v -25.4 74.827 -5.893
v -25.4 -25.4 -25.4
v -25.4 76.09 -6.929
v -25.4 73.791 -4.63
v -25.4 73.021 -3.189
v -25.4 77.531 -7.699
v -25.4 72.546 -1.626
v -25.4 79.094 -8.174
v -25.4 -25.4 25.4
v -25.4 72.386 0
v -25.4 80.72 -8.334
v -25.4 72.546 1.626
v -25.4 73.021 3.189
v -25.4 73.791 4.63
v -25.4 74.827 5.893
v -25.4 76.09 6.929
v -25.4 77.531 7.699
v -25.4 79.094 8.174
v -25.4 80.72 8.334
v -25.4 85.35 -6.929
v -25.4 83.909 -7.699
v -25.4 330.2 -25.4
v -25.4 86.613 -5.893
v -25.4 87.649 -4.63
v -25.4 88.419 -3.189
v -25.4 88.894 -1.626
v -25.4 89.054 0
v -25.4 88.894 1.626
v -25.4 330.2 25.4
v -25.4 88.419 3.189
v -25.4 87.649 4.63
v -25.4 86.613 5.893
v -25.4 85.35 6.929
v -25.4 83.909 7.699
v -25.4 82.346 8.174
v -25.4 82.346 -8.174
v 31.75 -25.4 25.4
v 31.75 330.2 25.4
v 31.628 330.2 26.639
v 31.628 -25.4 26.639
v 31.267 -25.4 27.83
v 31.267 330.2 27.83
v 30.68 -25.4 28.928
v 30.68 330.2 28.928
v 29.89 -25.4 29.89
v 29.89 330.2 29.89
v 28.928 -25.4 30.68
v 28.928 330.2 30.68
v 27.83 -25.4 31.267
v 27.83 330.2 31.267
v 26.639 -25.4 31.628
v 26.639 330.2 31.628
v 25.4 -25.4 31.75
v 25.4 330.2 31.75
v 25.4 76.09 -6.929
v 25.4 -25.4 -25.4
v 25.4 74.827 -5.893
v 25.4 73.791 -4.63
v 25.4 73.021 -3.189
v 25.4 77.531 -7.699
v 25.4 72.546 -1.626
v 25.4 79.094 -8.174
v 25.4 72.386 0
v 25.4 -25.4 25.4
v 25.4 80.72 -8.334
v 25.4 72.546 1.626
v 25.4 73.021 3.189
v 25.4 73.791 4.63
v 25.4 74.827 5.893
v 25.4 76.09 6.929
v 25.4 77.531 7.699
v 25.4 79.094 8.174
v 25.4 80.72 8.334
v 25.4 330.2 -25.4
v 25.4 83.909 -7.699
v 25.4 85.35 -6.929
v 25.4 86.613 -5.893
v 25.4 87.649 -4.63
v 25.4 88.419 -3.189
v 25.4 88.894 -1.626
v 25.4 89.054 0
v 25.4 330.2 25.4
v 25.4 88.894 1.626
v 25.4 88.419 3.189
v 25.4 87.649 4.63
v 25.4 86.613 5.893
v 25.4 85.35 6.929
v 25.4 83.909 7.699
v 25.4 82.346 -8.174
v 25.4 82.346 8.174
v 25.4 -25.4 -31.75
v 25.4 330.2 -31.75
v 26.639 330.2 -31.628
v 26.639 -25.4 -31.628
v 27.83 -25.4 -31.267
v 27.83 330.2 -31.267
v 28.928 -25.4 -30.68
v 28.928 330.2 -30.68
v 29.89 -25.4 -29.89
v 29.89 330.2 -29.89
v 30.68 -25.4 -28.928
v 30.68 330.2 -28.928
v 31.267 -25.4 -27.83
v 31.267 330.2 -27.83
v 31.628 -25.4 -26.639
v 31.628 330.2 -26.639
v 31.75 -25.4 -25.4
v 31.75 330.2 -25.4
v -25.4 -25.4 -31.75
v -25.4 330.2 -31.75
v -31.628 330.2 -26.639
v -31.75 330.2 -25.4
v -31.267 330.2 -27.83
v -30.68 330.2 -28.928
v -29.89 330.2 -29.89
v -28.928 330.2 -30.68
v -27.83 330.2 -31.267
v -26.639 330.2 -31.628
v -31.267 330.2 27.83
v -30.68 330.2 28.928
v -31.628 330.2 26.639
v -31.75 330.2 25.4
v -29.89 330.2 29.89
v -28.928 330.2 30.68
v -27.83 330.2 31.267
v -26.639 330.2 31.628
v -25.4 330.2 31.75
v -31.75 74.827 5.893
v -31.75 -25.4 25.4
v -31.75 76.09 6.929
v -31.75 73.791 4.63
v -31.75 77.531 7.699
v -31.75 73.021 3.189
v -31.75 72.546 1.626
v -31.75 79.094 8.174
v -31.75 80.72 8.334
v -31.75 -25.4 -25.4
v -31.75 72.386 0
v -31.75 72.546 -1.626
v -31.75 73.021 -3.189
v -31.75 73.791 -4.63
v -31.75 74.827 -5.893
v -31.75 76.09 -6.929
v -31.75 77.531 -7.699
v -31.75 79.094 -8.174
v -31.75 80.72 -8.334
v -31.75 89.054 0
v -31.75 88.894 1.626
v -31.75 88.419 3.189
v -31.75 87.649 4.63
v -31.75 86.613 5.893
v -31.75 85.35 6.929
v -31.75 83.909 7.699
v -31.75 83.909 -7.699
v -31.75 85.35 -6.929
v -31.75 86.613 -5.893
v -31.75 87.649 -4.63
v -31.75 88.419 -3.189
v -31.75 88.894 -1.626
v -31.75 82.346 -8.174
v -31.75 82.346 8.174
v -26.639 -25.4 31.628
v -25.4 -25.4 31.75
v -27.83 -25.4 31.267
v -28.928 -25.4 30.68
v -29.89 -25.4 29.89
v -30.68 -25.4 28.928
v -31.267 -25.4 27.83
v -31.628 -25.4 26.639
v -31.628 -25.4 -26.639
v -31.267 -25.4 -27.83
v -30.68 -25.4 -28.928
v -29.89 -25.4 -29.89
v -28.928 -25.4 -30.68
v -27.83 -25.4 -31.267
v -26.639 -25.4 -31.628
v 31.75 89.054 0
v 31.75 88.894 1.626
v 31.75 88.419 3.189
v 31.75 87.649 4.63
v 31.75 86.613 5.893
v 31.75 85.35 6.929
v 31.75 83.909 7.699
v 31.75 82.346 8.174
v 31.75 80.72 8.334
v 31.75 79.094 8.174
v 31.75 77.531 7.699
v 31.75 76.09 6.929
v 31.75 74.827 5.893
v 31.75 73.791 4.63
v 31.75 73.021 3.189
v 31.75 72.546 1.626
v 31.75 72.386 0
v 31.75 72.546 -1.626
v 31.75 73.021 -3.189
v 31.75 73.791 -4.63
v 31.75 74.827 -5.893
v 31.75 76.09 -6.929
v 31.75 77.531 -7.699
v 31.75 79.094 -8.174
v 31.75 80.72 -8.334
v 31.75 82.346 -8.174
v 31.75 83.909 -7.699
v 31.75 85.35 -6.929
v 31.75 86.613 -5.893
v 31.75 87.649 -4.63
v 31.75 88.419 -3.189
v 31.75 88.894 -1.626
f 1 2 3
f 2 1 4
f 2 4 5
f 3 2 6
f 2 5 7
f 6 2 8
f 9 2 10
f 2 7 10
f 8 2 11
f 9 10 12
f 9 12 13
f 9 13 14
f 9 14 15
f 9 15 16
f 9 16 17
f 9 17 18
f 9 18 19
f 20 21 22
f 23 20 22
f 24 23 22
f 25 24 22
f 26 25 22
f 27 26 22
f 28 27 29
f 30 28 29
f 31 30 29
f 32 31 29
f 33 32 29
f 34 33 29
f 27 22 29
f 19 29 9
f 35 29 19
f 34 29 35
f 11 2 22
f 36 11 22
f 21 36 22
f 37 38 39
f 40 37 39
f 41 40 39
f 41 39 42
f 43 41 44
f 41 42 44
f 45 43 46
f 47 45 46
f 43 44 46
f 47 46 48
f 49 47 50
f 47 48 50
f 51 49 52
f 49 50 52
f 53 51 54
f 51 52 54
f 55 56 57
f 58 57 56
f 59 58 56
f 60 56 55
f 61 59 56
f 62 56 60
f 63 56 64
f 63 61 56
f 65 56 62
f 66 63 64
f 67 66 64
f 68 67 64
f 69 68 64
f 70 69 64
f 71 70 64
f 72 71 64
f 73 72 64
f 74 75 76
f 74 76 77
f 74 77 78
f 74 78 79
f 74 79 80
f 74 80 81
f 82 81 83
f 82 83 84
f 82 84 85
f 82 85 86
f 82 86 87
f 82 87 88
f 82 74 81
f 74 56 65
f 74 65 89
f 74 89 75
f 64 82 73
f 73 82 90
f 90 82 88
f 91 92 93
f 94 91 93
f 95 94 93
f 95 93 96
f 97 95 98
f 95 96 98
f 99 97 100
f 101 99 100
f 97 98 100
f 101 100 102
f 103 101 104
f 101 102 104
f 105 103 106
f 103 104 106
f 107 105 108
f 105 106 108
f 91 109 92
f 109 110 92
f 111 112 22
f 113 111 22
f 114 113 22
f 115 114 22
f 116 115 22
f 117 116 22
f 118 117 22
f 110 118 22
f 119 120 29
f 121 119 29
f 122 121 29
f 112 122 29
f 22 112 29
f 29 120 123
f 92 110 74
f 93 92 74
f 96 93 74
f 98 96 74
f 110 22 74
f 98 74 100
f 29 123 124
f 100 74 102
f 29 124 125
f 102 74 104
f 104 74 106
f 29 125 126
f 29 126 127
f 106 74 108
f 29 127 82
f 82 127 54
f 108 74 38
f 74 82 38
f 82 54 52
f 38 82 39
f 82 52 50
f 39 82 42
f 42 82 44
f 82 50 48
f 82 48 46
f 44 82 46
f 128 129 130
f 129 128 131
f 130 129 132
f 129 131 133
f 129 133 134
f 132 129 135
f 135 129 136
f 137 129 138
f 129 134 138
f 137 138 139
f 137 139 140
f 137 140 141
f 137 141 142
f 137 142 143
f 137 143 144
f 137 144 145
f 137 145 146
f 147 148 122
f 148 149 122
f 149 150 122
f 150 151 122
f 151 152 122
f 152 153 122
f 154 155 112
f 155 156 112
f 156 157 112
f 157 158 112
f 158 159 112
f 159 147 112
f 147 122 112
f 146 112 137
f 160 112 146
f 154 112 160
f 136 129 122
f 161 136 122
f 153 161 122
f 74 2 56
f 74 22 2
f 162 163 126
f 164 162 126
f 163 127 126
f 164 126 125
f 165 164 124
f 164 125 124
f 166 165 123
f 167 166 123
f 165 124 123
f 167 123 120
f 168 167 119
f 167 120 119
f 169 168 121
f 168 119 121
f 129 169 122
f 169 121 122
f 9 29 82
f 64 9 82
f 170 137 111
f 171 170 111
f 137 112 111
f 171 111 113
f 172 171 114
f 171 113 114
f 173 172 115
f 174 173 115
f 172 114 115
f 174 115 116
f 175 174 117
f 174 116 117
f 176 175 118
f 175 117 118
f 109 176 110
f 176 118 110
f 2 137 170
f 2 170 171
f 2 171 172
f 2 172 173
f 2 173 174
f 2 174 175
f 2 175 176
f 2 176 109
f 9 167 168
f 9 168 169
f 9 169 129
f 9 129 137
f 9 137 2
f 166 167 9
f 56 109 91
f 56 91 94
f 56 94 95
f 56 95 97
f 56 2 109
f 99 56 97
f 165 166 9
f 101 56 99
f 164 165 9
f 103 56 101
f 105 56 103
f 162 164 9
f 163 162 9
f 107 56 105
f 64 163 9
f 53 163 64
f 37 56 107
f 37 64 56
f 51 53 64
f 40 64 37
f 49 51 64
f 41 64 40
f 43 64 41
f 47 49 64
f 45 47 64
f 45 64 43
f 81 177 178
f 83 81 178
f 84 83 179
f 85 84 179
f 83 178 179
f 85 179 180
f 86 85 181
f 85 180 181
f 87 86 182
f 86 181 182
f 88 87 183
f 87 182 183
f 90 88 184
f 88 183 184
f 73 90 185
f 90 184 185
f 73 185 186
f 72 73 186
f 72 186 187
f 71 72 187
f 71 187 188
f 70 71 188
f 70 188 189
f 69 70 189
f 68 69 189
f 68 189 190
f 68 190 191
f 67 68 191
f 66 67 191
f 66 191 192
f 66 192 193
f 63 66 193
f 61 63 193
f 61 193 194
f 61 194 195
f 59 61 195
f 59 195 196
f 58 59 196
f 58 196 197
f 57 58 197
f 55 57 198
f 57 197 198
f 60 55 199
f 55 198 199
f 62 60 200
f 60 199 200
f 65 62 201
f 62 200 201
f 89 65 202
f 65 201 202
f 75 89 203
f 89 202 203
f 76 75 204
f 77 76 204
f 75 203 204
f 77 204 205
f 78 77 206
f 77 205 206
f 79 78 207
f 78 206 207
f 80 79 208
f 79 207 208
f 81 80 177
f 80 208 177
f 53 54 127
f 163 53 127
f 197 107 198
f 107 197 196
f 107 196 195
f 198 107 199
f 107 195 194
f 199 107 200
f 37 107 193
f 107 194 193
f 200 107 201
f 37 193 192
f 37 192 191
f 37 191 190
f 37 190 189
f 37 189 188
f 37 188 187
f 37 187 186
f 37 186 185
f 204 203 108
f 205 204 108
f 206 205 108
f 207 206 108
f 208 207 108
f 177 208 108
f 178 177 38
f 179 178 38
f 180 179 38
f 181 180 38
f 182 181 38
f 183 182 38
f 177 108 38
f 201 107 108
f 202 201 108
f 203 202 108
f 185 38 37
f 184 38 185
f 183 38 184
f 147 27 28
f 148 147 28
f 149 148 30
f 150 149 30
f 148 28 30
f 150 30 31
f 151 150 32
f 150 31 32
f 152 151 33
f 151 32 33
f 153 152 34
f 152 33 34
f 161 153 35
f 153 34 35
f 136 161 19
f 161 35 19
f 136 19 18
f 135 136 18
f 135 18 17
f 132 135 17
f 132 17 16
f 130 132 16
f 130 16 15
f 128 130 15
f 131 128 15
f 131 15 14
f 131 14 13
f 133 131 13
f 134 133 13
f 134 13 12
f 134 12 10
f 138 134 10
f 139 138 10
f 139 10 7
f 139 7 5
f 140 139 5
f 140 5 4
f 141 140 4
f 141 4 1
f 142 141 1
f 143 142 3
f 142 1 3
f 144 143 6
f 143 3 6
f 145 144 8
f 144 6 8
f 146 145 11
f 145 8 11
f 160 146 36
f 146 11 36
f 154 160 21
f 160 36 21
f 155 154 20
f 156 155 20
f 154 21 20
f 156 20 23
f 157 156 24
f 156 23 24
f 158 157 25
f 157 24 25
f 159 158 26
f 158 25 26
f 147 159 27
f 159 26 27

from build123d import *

# Parameters (mm, degrees)
F0_W     = 50.8
F0_H     = 50.8
F1_DEPTH = 330.2
F2_DEPTH = 25.4
F4_D     = 16.66748


with BuildPart() as f1:
    # F0 (on Front) → F1 (new body)
    with BuildSketch(Plane.XZ):
        with BuildLine():
            Line((25.4, 31.75), (-25.4, 31.75))
            ThreePointArc((-25.4, 31.75), (-29.8901280605, 29.8901280605), (-31.75, 25.4))
            Line((-31.75, 25.4), (-31.75, -25.4))
            ThreePointArc((-31.75, -25.4), (-29.8901280605, -29.8901280605), (-25.4, -31.75))
            Line((-25.4, -31.75), (25.4, -31.75))
            ThreePointArc((25.4, -31.75), (29.8901280605, -29.8901280605), (31.75, -25.4))
            Line((31.75, -25.4), (31.75, 25.4))
            ThreePointArc((31.75, 25.4), (29.8901280605, 29.8901280605), (25.4, 31.75))
        make_face()
        Rectangle(F0_W, F0_H, mode=Mode.SUBTRACT)
    extrude(amount=-F1_DEPTH)

    # F0 (on Front) → F2 (join)
    with BuildSketch(Plane.XZ):
        with BuildLine():
            Line((25.4, 31.75), (-25.4, 31.75))
            ThreePointArc((-25.4, 31.75), (-29.8901280605, 29.8901280605), (-31.75, 25.4))
            Line((-31.75, 25.4), (-31.75, -25.4))
            ThreePointArc((-31.75, -25.4), (-29.8901280605, -29.8901280605), (-25.4, -31.75))
            Line((-25.4, -31.75), (25.4, -31.75))
            ThreePointArc((25.4, -31.75), (29.8901280605, -29.8901280605), (31.75, -25.4))
            Line((31.75, -25.4), (31.75, 25.4))
            ThreePointArc((31.75, 25.4), (29.8901280605, 29.8901280605), (25.4, 31.75))
        make_face()
        Rectangle(F0_W, F0_H, mode=Mode.SUBTRACT)
    extrude(amount=F2_DEPTH)

    # F4 (through all)
    with Locations(Plane(origin=(-31.75, 0, 0), x_dir=(0, -1, 0), z_dir=(-1, 0, 0))):
        with Locations((-80.720094915, 0)):
            Hole(F4_D / 2)


solid = f1.part
